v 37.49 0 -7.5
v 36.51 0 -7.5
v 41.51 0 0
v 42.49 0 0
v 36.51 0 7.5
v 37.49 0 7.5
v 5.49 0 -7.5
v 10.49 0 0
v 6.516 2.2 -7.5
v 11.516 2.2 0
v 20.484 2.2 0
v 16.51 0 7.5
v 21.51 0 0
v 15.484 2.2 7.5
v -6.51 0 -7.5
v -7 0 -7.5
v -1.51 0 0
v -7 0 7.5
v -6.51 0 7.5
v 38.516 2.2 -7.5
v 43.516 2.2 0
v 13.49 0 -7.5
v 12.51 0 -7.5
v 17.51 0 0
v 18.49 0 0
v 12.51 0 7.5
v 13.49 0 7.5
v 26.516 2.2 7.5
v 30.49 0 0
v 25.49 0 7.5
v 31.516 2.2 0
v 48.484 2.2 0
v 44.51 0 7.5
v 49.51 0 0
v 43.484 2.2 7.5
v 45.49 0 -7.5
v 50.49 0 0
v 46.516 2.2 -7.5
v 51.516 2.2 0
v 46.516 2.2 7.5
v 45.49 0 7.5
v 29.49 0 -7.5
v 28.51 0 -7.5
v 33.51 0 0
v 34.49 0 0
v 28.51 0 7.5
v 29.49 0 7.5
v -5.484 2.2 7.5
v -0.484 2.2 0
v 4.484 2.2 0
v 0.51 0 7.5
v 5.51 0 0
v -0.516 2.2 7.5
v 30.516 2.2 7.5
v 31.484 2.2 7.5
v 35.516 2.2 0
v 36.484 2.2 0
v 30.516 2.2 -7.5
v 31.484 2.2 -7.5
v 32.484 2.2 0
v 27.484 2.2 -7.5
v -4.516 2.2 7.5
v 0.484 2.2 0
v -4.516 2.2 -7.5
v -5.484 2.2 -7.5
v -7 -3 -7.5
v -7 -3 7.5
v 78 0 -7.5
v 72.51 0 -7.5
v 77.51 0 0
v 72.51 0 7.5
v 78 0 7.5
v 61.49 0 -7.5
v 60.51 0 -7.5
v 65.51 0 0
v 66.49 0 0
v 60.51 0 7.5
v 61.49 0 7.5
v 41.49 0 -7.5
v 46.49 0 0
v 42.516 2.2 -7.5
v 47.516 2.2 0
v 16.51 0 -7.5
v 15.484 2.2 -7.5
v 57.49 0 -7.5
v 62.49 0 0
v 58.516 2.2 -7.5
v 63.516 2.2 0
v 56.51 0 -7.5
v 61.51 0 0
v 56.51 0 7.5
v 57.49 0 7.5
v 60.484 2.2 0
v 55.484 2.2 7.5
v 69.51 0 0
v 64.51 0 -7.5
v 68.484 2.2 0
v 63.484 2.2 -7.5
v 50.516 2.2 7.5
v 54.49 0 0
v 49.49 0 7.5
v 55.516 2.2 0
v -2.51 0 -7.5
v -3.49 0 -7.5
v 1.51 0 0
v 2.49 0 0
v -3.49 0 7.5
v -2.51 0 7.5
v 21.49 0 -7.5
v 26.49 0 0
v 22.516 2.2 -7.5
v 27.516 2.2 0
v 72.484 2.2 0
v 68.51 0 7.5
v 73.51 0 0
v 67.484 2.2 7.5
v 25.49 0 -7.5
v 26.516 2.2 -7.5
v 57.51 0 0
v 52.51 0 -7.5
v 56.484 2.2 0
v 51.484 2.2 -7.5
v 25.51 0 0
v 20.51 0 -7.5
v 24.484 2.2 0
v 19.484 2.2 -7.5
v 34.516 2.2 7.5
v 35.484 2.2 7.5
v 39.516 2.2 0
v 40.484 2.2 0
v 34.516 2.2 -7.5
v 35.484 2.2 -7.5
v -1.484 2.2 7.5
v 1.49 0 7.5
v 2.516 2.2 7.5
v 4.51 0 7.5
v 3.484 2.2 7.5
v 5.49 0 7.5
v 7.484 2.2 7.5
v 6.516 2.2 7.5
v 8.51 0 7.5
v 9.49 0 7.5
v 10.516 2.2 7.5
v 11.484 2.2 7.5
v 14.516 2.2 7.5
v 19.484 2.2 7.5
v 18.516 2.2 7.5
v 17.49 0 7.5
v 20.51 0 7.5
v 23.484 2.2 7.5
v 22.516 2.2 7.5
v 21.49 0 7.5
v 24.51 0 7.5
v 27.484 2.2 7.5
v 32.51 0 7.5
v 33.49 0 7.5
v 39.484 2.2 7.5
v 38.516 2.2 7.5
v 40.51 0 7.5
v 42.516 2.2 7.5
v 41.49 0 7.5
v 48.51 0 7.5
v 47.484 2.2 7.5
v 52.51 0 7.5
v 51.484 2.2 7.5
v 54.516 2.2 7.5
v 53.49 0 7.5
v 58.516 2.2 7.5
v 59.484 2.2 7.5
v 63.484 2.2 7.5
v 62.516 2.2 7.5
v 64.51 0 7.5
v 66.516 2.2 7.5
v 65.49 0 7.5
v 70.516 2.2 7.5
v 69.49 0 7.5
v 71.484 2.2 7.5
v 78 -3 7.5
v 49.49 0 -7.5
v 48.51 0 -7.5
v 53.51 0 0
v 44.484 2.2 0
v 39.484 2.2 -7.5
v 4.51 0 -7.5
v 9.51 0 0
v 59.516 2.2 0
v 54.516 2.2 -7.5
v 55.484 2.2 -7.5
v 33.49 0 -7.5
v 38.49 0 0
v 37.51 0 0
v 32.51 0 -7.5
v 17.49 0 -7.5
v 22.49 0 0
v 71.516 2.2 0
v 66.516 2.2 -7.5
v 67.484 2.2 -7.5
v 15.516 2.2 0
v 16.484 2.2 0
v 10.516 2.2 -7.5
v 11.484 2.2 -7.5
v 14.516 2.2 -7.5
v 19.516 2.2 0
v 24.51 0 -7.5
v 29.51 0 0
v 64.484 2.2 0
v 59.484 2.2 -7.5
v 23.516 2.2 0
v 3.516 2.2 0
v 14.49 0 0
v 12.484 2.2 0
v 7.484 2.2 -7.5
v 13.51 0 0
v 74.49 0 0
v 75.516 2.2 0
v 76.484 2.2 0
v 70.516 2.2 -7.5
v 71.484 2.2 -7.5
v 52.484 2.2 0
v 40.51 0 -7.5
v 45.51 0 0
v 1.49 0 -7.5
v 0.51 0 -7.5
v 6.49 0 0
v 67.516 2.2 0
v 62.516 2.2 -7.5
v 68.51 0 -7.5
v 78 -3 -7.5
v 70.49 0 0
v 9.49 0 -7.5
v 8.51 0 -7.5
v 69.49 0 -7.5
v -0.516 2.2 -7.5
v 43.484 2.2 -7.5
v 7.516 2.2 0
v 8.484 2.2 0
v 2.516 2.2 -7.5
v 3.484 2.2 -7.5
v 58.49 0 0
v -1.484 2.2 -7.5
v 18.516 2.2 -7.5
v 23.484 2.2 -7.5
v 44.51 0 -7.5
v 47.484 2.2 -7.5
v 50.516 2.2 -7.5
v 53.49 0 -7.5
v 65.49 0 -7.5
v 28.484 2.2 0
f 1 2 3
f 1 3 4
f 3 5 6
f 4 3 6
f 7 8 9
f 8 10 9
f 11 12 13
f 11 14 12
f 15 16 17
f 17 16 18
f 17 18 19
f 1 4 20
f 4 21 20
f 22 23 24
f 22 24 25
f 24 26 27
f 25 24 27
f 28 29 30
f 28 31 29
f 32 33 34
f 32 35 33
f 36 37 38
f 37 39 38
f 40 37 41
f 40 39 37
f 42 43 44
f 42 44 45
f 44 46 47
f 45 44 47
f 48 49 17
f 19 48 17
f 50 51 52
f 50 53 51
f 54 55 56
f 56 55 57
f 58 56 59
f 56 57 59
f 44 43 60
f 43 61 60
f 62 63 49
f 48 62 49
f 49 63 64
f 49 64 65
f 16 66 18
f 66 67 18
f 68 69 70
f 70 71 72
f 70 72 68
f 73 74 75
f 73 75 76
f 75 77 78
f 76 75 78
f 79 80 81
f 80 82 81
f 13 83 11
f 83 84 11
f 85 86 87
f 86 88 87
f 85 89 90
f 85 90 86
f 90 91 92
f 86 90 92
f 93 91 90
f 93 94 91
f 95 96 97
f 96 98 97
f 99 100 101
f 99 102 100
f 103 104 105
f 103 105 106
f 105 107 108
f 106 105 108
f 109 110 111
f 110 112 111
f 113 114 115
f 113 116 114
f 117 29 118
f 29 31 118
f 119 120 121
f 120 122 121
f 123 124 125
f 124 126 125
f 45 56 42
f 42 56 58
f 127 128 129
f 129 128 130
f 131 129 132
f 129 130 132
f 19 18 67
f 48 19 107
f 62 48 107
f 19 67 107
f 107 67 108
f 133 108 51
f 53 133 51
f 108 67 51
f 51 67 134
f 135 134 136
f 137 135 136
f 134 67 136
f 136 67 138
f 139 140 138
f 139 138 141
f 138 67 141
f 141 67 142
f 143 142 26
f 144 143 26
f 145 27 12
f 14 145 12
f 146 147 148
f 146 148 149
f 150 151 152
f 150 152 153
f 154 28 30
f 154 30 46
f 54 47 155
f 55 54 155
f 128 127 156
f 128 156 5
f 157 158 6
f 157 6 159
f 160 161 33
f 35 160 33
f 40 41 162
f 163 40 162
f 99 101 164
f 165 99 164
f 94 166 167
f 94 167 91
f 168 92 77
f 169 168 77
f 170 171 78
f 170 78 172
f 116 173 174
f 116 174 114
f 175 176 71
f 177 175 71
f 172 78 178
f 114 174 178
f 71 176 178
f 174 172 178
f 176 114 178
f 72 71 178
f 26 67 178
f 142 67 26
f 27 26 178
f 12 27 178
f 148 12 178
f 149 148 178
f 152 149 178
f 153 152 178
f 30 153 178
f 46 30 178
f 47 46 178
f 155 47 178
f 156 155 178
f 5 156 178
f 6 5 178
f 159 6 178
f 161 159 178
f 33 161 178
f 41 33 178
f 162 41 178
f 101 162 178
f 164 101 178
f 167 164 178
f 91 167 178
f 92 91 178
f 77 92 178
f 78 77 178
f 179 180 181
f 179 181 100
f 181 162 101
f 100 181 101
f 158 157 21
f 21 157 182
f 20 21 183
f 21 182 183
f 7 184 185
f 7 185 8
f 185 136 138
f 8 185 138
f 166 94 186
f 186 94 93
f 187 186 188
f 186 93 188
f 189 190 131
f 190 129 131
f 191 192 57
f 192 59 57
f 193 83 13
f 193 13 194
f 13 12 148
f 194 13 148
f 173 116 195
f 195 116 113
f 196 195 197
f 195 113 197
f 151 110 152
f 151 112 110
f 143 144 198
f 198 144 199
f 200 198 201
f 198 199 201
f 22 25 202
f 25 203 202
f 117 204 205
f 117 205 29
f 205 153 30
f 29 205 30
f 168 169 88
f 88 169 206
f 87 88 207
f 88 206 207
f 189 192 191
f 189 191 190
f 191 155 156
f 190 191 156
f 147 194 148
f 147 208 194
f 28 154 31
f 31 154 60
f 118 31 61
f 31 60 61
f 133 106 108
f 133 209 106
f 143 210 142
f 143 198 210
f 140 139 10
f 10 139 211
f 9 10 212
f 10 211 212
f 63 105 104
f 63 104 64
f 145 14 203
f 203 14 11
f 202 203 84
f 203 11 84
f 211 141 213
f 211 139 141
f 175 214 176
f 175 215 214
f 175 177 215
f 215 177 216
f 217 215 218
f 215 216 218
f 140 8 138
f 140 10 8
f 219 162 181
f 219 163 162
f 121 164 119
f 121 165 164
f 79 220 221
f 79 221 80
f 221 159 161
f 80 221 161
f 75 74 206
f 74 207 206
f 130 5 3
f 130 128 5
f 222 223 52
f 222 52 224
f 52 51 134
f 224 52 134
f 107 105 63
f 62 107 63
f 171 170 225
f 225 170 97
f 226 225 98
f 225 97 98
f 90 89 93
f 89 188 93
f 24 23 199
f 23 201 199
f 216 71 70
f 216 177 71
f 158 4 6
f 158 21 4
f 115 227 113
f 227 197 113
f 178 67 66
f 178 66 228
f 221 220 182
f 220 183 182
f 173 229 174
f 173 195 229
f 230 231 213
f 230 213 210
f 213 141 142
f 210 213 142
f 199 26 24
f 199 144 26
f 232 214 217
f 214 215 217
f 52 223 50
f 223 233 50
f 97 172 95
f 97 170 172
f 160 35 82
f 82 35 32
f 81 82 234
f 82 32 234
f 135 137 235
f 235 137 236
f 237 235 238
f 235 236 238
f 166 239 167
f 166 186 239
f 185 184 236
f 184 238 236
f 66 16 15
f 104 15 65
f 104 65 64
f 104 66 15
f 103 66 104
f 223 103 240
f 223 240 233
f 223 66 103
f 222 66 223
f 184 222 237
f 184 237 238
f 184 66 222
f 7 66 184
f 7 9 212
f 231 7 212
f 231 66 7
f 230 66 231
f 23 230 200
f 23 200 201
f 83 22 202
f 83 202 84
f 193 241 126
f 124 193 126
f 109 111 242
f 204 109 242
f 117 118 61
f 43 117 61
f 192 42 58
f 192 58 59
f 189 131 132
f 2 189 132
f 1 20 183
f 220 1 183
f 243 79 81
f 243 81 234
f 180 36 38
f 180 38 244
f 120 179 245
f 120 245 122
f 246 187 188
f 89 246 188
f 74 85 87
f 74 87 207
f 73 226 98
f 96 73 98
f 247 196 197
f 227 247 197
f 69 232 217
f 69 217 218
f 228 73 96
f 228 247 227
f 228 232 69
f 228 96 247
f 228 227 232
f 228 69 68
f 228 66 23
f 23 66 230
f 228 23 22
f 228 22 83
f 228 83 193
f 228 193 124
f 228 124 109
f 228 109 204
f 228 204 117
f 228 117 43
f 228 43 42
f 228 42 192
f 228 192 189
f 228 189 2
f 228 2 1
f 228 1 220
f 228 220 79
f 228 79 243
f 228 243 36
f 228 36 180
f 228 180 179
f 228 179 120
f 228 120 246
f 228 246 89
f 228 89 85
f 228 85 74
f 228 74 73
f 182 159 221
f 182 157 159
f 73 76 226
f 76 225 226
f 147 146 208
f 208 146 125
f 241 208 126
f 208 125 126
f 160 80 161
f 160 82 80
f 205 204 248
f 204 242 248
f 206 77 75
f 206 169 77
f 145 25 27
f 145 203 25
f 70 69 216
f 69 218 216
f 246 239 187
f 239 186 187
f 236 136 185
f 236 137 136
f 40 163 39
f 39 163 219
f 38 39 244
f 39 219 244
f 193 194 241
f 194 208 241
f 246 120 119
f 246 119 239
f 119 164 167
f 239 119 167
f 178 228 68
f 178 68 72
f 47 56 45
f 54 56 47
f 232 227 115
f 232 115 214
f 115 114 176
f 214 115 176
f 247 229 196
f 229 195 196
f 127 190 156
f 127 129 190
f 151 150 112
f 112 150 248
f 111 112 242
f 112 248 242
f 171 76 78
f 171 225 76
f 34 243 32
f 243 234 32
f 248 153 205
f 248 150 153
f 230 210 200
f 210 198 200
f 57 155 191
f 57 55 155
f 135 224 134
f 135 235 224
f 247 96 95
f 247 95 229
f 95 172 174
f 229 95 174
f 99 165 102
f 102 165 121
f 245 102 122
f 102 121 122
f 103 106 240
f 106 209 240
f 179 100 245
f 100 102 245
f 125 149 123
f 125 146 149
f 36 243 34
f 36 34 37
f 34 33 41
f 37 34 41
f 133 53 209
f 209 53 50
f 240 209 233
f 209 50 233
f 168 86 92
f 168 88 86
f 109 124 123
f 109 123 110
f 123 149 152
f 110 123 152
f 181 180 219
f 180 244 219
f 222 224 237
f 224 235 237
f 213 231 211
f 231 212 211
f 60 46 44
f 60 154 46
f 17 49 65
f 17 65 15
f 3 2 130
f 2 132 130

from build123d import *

# Parameters (mm, degrees)
SKETCH3_W                    = 9
SKETCH3_H                    = 3
EXTRUDE_END_DEPTH            = 7.5
PATTERN_START                = -3
PATTERN_HALF_TEETH_OUTLINE_W = 76
PATTERN_HALF_TEETH_OUTLINE_H = 7.5
PATTERN_HALF_TEETH_DEPTH     = 3


with BuildPart() as part:
    # Sweep Half Tooth: sweep along a path in Sketch2
    with BuildLine(Plane(origin=(0, 0, 0), x_dir=(1, 0, 0), z_dir=(0, 1, 0))) as sweep_half_tooth_path:
        Line((0, 0), (-5, -7.5))
    # Sketch1 → Sweep Half Tooth (sweep)
    with BuildSketch(Plane.XY):
        Polygon((-0.483692342, 2.2), (0.483692342, 2.2), (1.50956919, 0), (2, 0), (2, -3), (-2, -3), (-2, 0), (-1.50956919, 0), align=None)
    sweep(path=sweep_half_tooth_path.line)

    # Sketch3 → Extrude End (add)
    with BuildSketch(Plane.XY):
        with Locations((-2.5, -1.5)):
            Rectangle(SKETCH3_W, SKETCH3_H)
    extrude(amount=EXTRUDE_END_DEPTH)

    # Pattern Half Teeth: read off the stored shape, not the designer's step
    # Pattern Half Teeth outline → Pattern Half Teeth (add)
    with BuildSketch(Plane(origin=(0, 0, 0), x_dir=(1, 0, 0), z_dir=(0, 1, 0)).offset(PATTERN_START)):
        with Locations((40, -3.75)):
            Rectangle(PATTERN_HALF_TEETH_OUTLINE_W, PATTERN_HALF_TEETH_OUTLINE_H)
    extrude(amount=PATTERN_HALF_TEETH_DEPTH)

    # Pattern Half Teeth 2: loft between two sections, ruled curve by curve
    pattern_half_teeth_2_from = [
        Edge.make_line((0.50956919, 0, 7.5), (5.50956919, 0, 0)),
        Edge.make_line((2.49043081, 0, 0), (-2.50956919, 0, 7.5)),
        Edge.make_line((2.49043081, 0, 0), (5.50956919, 0, 0)),
        Edge.make_line((-2.50956919, 0, 7.5), (0.50956919, 0, 7.5)),
    ]
    pattern_half_teeth_2_to = [
        Edge.make_line((-0.516307658, 2.2, 7.5), (4.483692342, 2.2, 0)),
        Edge.make_line((3.516307658, 2.2, 0), (-1.483692342, 2.2, 7.5)),
        Edge.make_line((3.516307658, 2.2, 0), (4.483692342, 2.2, 0)),
        Edge.make_line((-1.483692342, 2.2, 7.5), (-0.516307658, 2.2, 7.5)),
    ]
    pattern_half_teeth_2 = Solid(Shell([*[Face.make_surface_from_curves(pattern_half_teeth_2_from[k], pattern_half_teeth_2_to[k]) for k in range(4)], Face(Wire(pattern_half_teeth_2_from)), Face(Wire(pattern_half_teeth_2_to))]))
    add(pattern_half_teeth_2)

    # Pattern Half Teeth 3: loft between two sections, ruled curve by curve
    pattern_half_teeth_3_from = [
        Edge.make_line((4.50956919, 0, 7.5), (9.50956919, 0, 0)),
        Edge.make_line((6.49043081, 0, 0), (1.49043081, 0, 7.5)),
        Edge.make_line((1.49043081, 0, 7.5), (4.50956919, 0, 7.5)),
        Edge.make_line((6.49043081, 0, 0), (9.50956919, 0, 0)),
    ]
    pattern_half_teeth_3_to = [
        Edge.make_line((3.483692342, 2.2, 7.5), (8.483692342, 2.2, 0)),
        Edge.make_line((7.516307658, 2.2, 0), (2.516307658, 2.2, 7.5)),
        Edge.make_line((2.516307658, 2.2, 7.5), (3.483692342, 2.2, 7.5)),
        Edge.make_line((7.516307658, 2.2, 0), (8.483692342, 2.2, 0)),
    ]
    pattern_half_teeth_3 = Solid(Shell([*[Face.make_surface_from_curves(pattern_half_teeth_3_from[k], pattern_half_teeth_3_to[k]) for k in range(4)], Face(Wire(pattern_half_teeth_3_from)), Face(Wire(pattern_half_teeth_3_to))]))
    add(pattern_half_teeth_3)

    # Pattern Half Teeth 4: loft between two sections, ruled curve by curve
    pattern_half_teeth_4_from = [
        Edge.make_line((8.50956919, 0, 7.5), (13.50956919, 0, 0)),
        Edge.make_line((10.49043081, 0, 0), (5.49043081, 0, 7.5)),
        Edge.make_line((5.49043081, 0, 7.5), (8.50956919, 0, 7.5)),
        Edge.make_line((10.49043081, 0, 0), (13.50956919, 0, 0)),
    ]
    pattern_half_teeth_4_to = [
        Edge.make_line((7.483692342, 2.2, 7.5), (12.483692342, 2.2, 0)),
        Edge.make_line((11.516307658, 2.2, 0), (6.516307658, 2.2, 7.5)),
        Edge.make_line((6.516307658, 2.2, 7.5), (7.483692342, 2.2, 7.5)),
        Edge.make_line((11.516307658, 2.2, 0), (12.483692342, 2.2, 0)),
    ]
    pattern_half_teeth_4 = Solid(Shell([*[Face.make_surface_from_curves(pattern_half_teeth_4_from[k], pattern_half_teeth_4_to[k]) for k in range(4)], Face(Wire(pattern_half_teeth_4_from)), Face(Wire(pattern_half_teeth_4_to))]))
    add(pattern_half_teeth_4)

    # Pattern Half Teeth 5: loft between two sections, ruled curve by curve
    pattern_half_teeth_5_from = [
        Edge.make_line((12.50956919, 0, 7.5), (17.50956919, 0, 0)),
        Edge.make_line((14.49043081, 0, 0), (9.49043081, 0, 7.5)),
        Edge.make_line((14.49043081, 0, 0), (17.50956919, 0, 0)),
        Edge.make_line((9.49043081, 0, 7.5), (12.50956919, 0, 7.5)),
    ]
    pattern_half_teeth_5_to = [
        Edge.make_line((11.483692342, 2.2, 7.5), (16.483692342, 2.2, 0)),
        Edge.make_line((15.516307658, 2.2, 0), (10.516307658, 2.2, 7.5)),
        Edge.make_line((15.516307658, 2.2, 0), (16.483692342, 2.2, 0)),
        Edge.make_line((10.516307658, 2.2, 7.5), (11.483692342, 2.2, 7.5)),
    ]
    pattern_half_teeth_5 = Solid(Shell([*[Face.make_surface_from_curves(pattern_half_teeth_5_from[k], pattern_half_teeth_5_to[k]) for k in range(4)], Face(Wire(pattern_half_teeth_5_from)), Face(Wire(pattern_half_teeth_5_to))]))
    add(pattern_half_teeth_5)

    # Pattern Half Teeth 6: loft between two sections, ruled curve by curve
    pattern_half_teeth_6_from = [
        Edge.make_line((16.50956919, 0, 7.5), (21.50956919, 0, 0)),
        Edge.make_line((18.49043081, 0, 0), (13.49043081, 0, 7.5)),
        Edge.make_line((18.49043081, 0, 0), (21.50956919, 0, 0)),
        Edge.make_line((13.49043081, 0, 7.5), (16.50956919, 0, 7.5)),
    ]
    pattern_half_teeth_6_to = [
        Edge.make_line((15.483692342, 2.2, 7.5), (20.483692342, 2.2, 0)),
        Edge.make_line((19.516307658, 2.2, 0), (14.516307658, 2.2, 7.5)),
        Edge.make_line((19.516307658, 2.2, 0), (20.483692342, 2.2, 0)),
        Edge.make_line((14.516307658, 2.2, 7.5), (15.483692342, 2.2, 7.5)),
    ]
    pattern_half_teeth_6 = Solid(Shell([*[Face.make_surface_from_curves(pattern_half_teeth_6_from[k], pattern_half_teeth_6_to[k]) for k in range(4)], Face(Wire(pattern_half_teeth_6_from)), Face(Wire(pattern_half_teeth_6_to))]))
    add(pattern_half_teeth_6)

    # Pattern Half Teeth 7: loft between two sections, ruled curve by curve
    pattern_half_teeth_7_from = [
        Edge.make_line((20.50956919, 0, 7.5), (25.50956919, 0, 0)),
        Edge.make_line((22.49043081, 0, 0), (17.49043081, 0, 7.5)),
        Edge.make_line((22.49043081, 0, 0), (25.50956919, 0, 0)),
        Edge.make_line((17.49043081, 0, 7.5), (20.50956919, 0, 7.5)),
    ]
    pattern_half_teeth_7_to = [
        Edge.make_line((19.483692342, 2.2, 7.5), (24.483692342, 2.2, 0)),
        Edge.make_line((23.516307658, 2.2, 0), (18.516307658, 2.2, 7.5)),
        Edge.make_line((23.516307658, 2.2, 0), (24.483692342, 2.2, 0)),
        Edge.make_line((18.516307658, 2.2, 7.5), (19.483692342, 2.2, 7.5)),
    ]
    pattern_half_teeth_7 = Solid(Shell([*[Face.make_surface_from_curves(pattern_half_teeth_7_from[k], pattern_half_teeth_7_to[k]) for k in range(4)], Face(Wire(pattern_half_teeth_7_from)), Face(Wire(pattern_half_teeth_7_to))]))
    add(pattern_half_teeth_7)

    # Pattern Half Teeth 8: loft between two sections, ruled curve by curve
    pattern_half_teeth_8_from = [
        Edge.make_line((24.50956919, 0, 7.5), (29.50956919, 0, 0)),
        Edge.make_line((26.49043081, 0, 0), (21.49043081, 0, 7.5)),
        Edge.make_line((26.49043081, 0, 0), (29.50956919, 0, 0)),
        Edge.make_line((21.49043081, 0, 7.5), (24.50956919, 0, 7.5)),
    ]
    pattern_half_teeth_8_to = [
        Edge.make_line((23.483692342, 2.2, 7.5), (28.483692342, 2.2, 0)),
        Edge.make_line((27.516307658, 2.2, 0), (22.516307658, 2.2, 7.5)),
        Edge.make_line((27.516307658, 2.2, 0), (28.483692342, 2.2, 0)),
        Edge.make_line((22.516307658, 2.2, 7.5), (23.483692342, 2.2, 7.5)),
    ]
    pattern_half_teeth_8 = Solid(Shell([*[Face.make_surface_from_curves(pattern_half_teeth_8_from[k], pattern_half_teeth_8_to[k]) for k in range(4)], Face(Wire(pattern_half_teeth_8_from)), Face(Wire(pattern_half_teeth_8_to))]))
    add(pattern_half_teeth_8)

    # Pattern Half Teeth 9: loft between two sections, ruled curve by curve
    pattern_half_teeth_9_from = [
        Edge.make_line((28.50956919, 0, 7.5), (33.50956919, 0, 0)),
        Edge.make_line((30.49043081, 0, 0), (25.49043081, 0, 7.5)),
        Edge.make_line((30.49043081, 0, 0), (33.50956919, 0, 0)),
        Edge.make_line((25.49043081, 0, 7.5), (28.50956919, 0, 7.5)),
    ]
    pattern_half_teeth_9_to = [
        Edge.make_line((27.483692342, 2.2, 7.5), (32.483692342, 2.2, 0)),
        Edge.make_line((31.516307658, 2.2, 0), (26.516307658, 2.2, 7.5)),
        Edge.make_line((31.516307658, 2.2, 0), (32.483692342, 2.2, 0)),
        Edge.make_line((26.516307658, 2.2, 7.5), (27.483692342, 2.2, 7.5)),
    ]
    pattern_half_teeth_9 = Solid(Shell([*[Face.make_surface_from_curves(pattern_half_teeth_9_from[k], pattern_half_teeth_9_to[k]) for k in range(4)], Face(Wire(pattern_half_teeth_9_from)), Face(Wire(pattern_half_teeth_9_to))]))
    add(pattern_half_teeth_9)

    # Pattern Half Teeth 10: loft between two sections, ruled curve by curve
    pattern_half_teeth_10_from = [
        Edge.make_line((32.50956919, 0, 7.5), (37.50956919, 0, 0)),
        Edge.make_line((34.49043081, 0, 0), (29.49043081, 0, 7.5)),
        Edge.make_line((34.49043081, 0, 0), (37.50956919, 0, 0)),
        Edge.make_line((29.49043081, 0, 7.5), (32.50956919, 0, 7.5)),
    ]
    pattern_half_teeth_10_to = [
        Edge.make_line((31.483692342, 2.2, 7.5), (36.483692342, 2.2, 0)),
        Edge.make_line((35.516307658, 2.2, 0), (30.516307658, 2.2, 7.5)),
        Edge.make_line((35.516307658, 2.2, 0), (36.483692342, 2.2, 0)),
        Edge.make_line((30.516307658, 2.2, 7.5), (31.483692342, 2.2, 7.5)),
    ]
    pattern_half_teeth_10 = Solid(Shell([*[Face.make_surface_from_curves(pattern_half_teeth_10_from[k], pattern_half_teeth_10_to[k]) for k in range(4)], Face(Wire(pattern_half_teeth_10_from)), Face(Wire(pattern_half_teeth_10_to))]))
    add(pattern_half_teeth_10)

    # Pattern Half Teeth 11: loft between two sections, ruled curve by curve
    pattern_half_teeth_11_from = [
        Edge.make_line((36.50956919, 0, 7.5), (41.50956919, 0, 0)),
        Edge.make_line((38.49043081, 0, 0), (33.49043081, 0, 7.5)),
        Edge.make_line((38.49043081, 0, 0), (41.50956919, 0, 0)),
        Edge.make_line((33.49043081, 0, 7.5), (36.50956919, 0, 7.5)),
    ]
    pattern_half_teeth_11_to = [
        Edge.make_line((35.483692342, 2.2, 7.5), (40.483692342, 2.2, 0)),
        Edge.make_line((39.516307658, 2.2, 0), (34.516307658, 2.2, 7.5)),
        Edge.make_line((39.516307658, 2.2, 0), (40.483692342, 2.2, 0)),
        Edge.make_line((34.516307658, 2.2, 7.5), (35.483692342, 2.2, 7.5)),
    ]
    pattern_half_teeth_11 = Solid(Shell([*[Face.make_surface_from_curves(pattern_half_teeth_11_from[k], pattern_half_teeth_11_to[k]) for k in range(4)], Face(Wire(pattern_half_teeth_11_from)), Face(Wire(pattern_half_teeth_11_to))]))
    add(pattern_half_teeth_11)

    # Pattern Half Teeth 12: loft between two sections, ruled curve by curve
    pattern_half_teeth_12_from = [
        Edge.make_line((40.50956919, 0, 7.5), (45.50956919, 0, 0)),
        Edge.make_line((42.49043081, 0, 0), (37.49043081, 0, 7.5)),
        Edge.make_line((42.49043081, 0, 0), (45.50956919, 0, 0)),
        Edge.make_line((37.49043081, 0, 7.5), (40.50956919, 0, 7.5)),
    ]
    pattern_half_teeth_12_to = [
        Edge.make_line((39.483692342, 2.2, 7.5), (44.483692342, 2.2, 0)),
        Edge.make_line((43.516307658, 2.2, 0), (38.516307658, 2.2, 7.5)),
        Edge.make_line((43.516307658, 2.2, 0), (44.483692342, 2.2, 0)),
        Edge.make_line((38.516307658, 2.2, 7.5), (39.483692342, 2.2, 7.5)),
    ]
    pattern_half_teeth_12 = Solid(Shell([*[Face.make_surface_from_curves(pattern_half_teeth_12_from[k], pattern_half_teeth_12_to[k]) for k in range(4)], Face(Wire(pattern_half_teeth_12_from)), Face(Wire(pattern_half_teeth_12_to))]))
    add(pattern_half_teeth_12)

    # Pattern Half Teeth 13: loft between two sections, ruled curve by curve
    pattern_half_teeth_13_from = [
        Edge.make_line((44.50956919, 0, 7.5), (49.50956919, 0, 0)),
        Edge.make_line((46.49043081, 0, 0), (41.49043081, 0, 7.5)),
        Edge.make_line((46.49043081, 0, 0), (49.50956919, 0, 0)),
        Edge.make_line((41.49043081, 0, 7.5), (44.50956919, 0, 7.5)),
    ]
    pattern_half_teeth_13_to = [
        Edge.make_line((43.483692342, 2.2, 7.5), (48.483692342, 2.2, 0)),
        Edge.make_line((47.516307658, 2.2, 0), (42.516307658, 2.2, 7.5)),
        Edge.make_line((47.516307658, 2.2, 0), (48.483692342, 2.2, 0)),
        Edge.make_line((42.516307658, 2.2, 7.5), (43.483692342, 2.2, 7.5)),
    ]
    pattern_half_teeth_13 = Solid(Shell([*[Face.make_surface_from_curves(pattern_half_teeth_13_from[k], pattern_half_teeth_13_to[k]) for k in range(4)], Face(Wire(pattern_half_teeth_13_from)), Face(Wire(pattern_half_teeth_13_to))]))
    add(pattern_half_teeth_13)

    # Pattern Half Teeth 14: loft between two sections, ruled curve by curve
    pattern_half_teeth_14_from = [
        Edge.make_line((48.50956919, 0, 7.5), (53.50956919, 0, 0)),
        Edge.make_line((50.49043081, 0, 0), (45.49043081, 0, 7.5)),
        Edge.make_line((50.49043081, 0, 0), (53.50956919, 0, 0)),
        Edge.make_line((45.49043081, 0, 7.5), (48.50956919, 0, 7.5)),
    ]
    pattern_half_teeth_14_to = [
        Edge.make_line((47.483692342, 2.2, 7.5), (52.483692342, 2.2, 0)),
        Edge.make_line((51.516307658, 2.2, 0), (46.516307658, 2.2, 7.5)),
        Edge.make_line((51.516307658, 2.2, 0), (52.483692342, 2.2, 0)),
        Edge.make_line((46.516307658, 2.2, 7.5), (47.483692342, 2.2, 7.5)),
    ]
    pattern_half_teeth_14 = Solid(Shell([*[Face.make_surface_from_curves(pattern_half_teeth_14_from[k], pattern_half_teeth_14_to[k]) for k in range(4)], Face(Wire(pattern_half_teeth_14_from)), Face(Wire(pattern_half_teeth_14_to))]))
    add(pattern_half_teeth_14)

    # Pattern Half Teeth 15: loft between two sections, ruled curve by curve
    pattern_half_teeth_15_from = [
        Edge.make_line((52.50956919, 0, 7.5), (57.50956919, 0, 0)),
        Edge.make_line((54.49043081, 0, 0), (49.49043081, 0, 7.5)),
        Edge.make_line((54.49043081, 0, 0), (57.50956919, 0, 0)),
        Edge.make_line((49.49043081, 0, 7.5), (52.50956919, 0, 7.5)),
    ]
    pattern_half_teeth_15_to = [
        Edge.make_line((51.483692342, 2.2, 7.5), (56.483692342, 2.2, 0)),
        Edge.make_line((55.516307658, 2.2, 0), (50.516307658, 2.2, 7.5)),
        Edge.make_line((55.516307658, 2.2, 0), (56.483692342, 2.2, 0)),
        Edge.make_line((50.516307658, 2.2, 7.5), (51.483692342, 2.2, 7.5)),
    ]
    pattern_half_teeth_15 = Solid(Shell([*[Face.make_surface_from_curves(pattern_half_teeth_15_from[k], pattern_half_teeth_15_to[k]) for k in range(4)], Face(Wire(pattern_half_teeth_15_from)), Face(Wire(pattern_half_teeth_15_to))]))
    add(pattern_half_teeth_15)

    # Pattern Half Teeth 16: loft between two sections, ruled curve by curve
    pattern_half_teeth_16_from = [
        Edge.make_line((56.50956919, 0, 7.5), (61.50956919, 0, 0)),
        Edge.make_line((58.49043081, 0, 0), (53.49043081, 0, 7.5)),
        Edge.make_line((58.49043081, 0, 0), (61.50956919, 0, 0)),
        Edge.make_line((53.49043081, 0, 7.5), (56.50956919, 0, 7.5)),
    ]
    pattern_half_teeth_16_to = [
        Edge.make_line((55.483692342, 2.2, 7.5), (60.483692342, 2.2, 0)),
        Edge.make_line((59.516307658, 2.2, 0), (54.516307658, 2.2, 7.5)),
        Edge.make_line((59.516307658, 2.2, 0), (60.483692342, 2.2, 0)),
        Edge.make_line((54.516307658, 2.2, 7.5), (55.483692342, 2.2, 7.5)),
    ]
    pattern_half_teeth_16 = Solid(Shell([*[Face.make_surface_from_curves(pattern_half_teeth_16_from[k], pattern_half_teeth_16_to[k]) for k in range(4)], Face(Wire(pattern_half_teeth_16_from)), Face(Wire(pattern_half_teeth_16_to))]))
    add(pattern_half_teeth_16)

    # Pattern Half Teeth 17: loft between two sections, ruled curve by curve
    pattern_half_teeth_17_from = [
        Edge.make_line((60.50956919, 0, 7.5), (65.50956919, 0, 0)),
        Edge.make_line((62.49043081, 0, 0), (57.49043081, 0, 7.5)),
        Edge.make_line((62.49043081, 0, 0), (65.50956919, 0, 0)),
        Edge.make_line((57.49043081, 0, 7.5), (60.50956919, 0, 7.5)),
    ]
    pattern_half_teeth_17_to = [
        Edge.make_line((59.483692342, 2.2, 7.5), (64.483692342, 2.2, 0)),
        Edge.make_line((63.516307658, 2.2, 0), (58.516307658, 2.2, 7.5)),
        Edge.make_line((63.516307658, 2.2, 0), (64.483692342, 2.2, 0)),
        Edge.make_line((58.516307658, 2.2, 7.5), (59.483692342, 2.2, 7.5)),
    ]
    pattern_half_teeth_17 = Solid(Shell([*[Face.make_surface_from_curves(pattern_half_teeth_17_from[k], pattern_half_teeth_17_to[k]) for k in range(4)], Face(Wire(pattern_half_teeth_17_from)), Face(Wire(pattern_half_teeth_17_to))]))
    add(pattern_half_teeth_17)

    # Pattern Half Teeth 18: loft between two sections, ruled curve by curve
    pattern_half_teeth_18_from = [
        Edge.make_line((64.50956919, 0, 7.5), (69.50956919, 0, 0)),
        Edge.make_line((66.49043081, 0, 0), (61.49043081, 0, 7.5)),
        Edge.make_line((66.49043081, 0, 0), (69.50956919, 0, 0)),
        Edge.make_line((61.49043081, 0, 7.5), (64.50956919, 0, 7.5)),
    ]
    pattern_half_teeth_18_to = [
        Edge.make_line((63.483692342, 2.2, 7.5), (68.483692342, 2.2, 0)),
        Edge.make_line((67.516307658, 2.2, 0), (62.516307658, 2.2, 7.5)),
        Edge.make_line((67.516307658, 2.2, 0), (68.483692342, 2.2, 0)),
        Edge.make_line((62.516307658, 2.2, 7.5), (63.483692342, 2.2, 7.5)),
    ]
    pattern_half_teeth_18 = Solid(Shell([*[Face.make_surface_from_curves(pattern_half_teeth_18_from[k], pattern_half_teeth_18_to[k]) for k in range(4)], Face(Wire(pattern_half_teeth_18_from)), Face(Wire(pattern_half_teeth_18_to))]))
    add(pattern_half_teeth_18)

    # Pattern Half Teeth 19: loft between two sections, ruled curve by curve
    pattern_half_teeth_19_from = [
        Edge.make_line((68.50956919, 0, 7.5), (73.50956919, 0, 0)),
        Edge.make_line((70.49043081, 0, 0), (65.49043081, 0, 7.5)),
        Edge.make_line((70.49043081, 0, 0), (73.50956919, 0, 0)),
        Edge.make_line((65.49043081, 0, 7.5), (68.50956919, 0, 7.5)),
    ]
    pattern_half_teeth_19_to = [
        Edge.make_line((67.483692342, 2.2, 7.5), (72.483692342, 2.2, 0)),
        Edge.make_line((71.516307658, 2.2, 0), (66.516307658, 2.2, 7.5)),
        Edge.make_line((71.516307658, 2.2, 0), (72.483692342, 2.2, 0)),
        Edge.make_line((66.516307658, 2.2, 7.5), (67.483692342, 2.2, 7.5)),
    ]
    pattern_half_teeth_19 = Solid(Shell([*[Face.make_surface_from_curves(pattern_half_teeth_19_from[k], pattern_half_teeth_19_to[k]) for k in range(4)], Face(Wire(pattern_half_teeth_19_from)), Face(Wire(pattern_half_teeth_19_to))]))
    add(pattern_half_teeth_19)

    # Pattern Half Teeth 20: loft between two sections, ruled curve by curve
    pattern_half_teeth_20_from = [
        Edge.make_line((72.50956919, 0, 7.5), (77.50956919, 0, 0)),
        Edge.make_line((74.49043081, 0, 0), (69.49043081, 0, 7.5)),
        Edge.make_line((74.49043081, 0, 0), (77.50956919, 0, 0)),
        Edge.make_line((69.49043081, 0, 7.5), (72.50956919, 0, 7.5)),
    ]
    pattern_half_teeth_20_to = [
        Edge.make_line((71.483692342, 2.2, 7.5), (76.483692342, 2.2, 0)),
        Edge.make_line((75.516307658, 2.2, 0), (70.516307658, 2.2, 7.5)),
        Edge.make_line((75.516307658, 2.2, 0), (76.483692342, 2.2, 0)),
        Edge.make_line((70.516307658, 2.2, 7.5), (71.483692342, 2.2, 7.5)),
    ]
    pattern_half_teeth_20 = Solid(Shell([*[Face.make_surface_from_curves(pattern_half_teeth_20_from[k], pattern_half_teeth_20_to[k]) for k in range(4)], Face(Wire(pattern_half_teeth_20_from)), Face(Wire(pattern_half_teeth_20_to))]))
    add(pattern_half_teeth_20)

    # Mirror Teeth: part across plane


with BuildPart() as part_1:
    add(part.part)
    add(part.part.mirror(Plane.XY))


solid = part_1.part
